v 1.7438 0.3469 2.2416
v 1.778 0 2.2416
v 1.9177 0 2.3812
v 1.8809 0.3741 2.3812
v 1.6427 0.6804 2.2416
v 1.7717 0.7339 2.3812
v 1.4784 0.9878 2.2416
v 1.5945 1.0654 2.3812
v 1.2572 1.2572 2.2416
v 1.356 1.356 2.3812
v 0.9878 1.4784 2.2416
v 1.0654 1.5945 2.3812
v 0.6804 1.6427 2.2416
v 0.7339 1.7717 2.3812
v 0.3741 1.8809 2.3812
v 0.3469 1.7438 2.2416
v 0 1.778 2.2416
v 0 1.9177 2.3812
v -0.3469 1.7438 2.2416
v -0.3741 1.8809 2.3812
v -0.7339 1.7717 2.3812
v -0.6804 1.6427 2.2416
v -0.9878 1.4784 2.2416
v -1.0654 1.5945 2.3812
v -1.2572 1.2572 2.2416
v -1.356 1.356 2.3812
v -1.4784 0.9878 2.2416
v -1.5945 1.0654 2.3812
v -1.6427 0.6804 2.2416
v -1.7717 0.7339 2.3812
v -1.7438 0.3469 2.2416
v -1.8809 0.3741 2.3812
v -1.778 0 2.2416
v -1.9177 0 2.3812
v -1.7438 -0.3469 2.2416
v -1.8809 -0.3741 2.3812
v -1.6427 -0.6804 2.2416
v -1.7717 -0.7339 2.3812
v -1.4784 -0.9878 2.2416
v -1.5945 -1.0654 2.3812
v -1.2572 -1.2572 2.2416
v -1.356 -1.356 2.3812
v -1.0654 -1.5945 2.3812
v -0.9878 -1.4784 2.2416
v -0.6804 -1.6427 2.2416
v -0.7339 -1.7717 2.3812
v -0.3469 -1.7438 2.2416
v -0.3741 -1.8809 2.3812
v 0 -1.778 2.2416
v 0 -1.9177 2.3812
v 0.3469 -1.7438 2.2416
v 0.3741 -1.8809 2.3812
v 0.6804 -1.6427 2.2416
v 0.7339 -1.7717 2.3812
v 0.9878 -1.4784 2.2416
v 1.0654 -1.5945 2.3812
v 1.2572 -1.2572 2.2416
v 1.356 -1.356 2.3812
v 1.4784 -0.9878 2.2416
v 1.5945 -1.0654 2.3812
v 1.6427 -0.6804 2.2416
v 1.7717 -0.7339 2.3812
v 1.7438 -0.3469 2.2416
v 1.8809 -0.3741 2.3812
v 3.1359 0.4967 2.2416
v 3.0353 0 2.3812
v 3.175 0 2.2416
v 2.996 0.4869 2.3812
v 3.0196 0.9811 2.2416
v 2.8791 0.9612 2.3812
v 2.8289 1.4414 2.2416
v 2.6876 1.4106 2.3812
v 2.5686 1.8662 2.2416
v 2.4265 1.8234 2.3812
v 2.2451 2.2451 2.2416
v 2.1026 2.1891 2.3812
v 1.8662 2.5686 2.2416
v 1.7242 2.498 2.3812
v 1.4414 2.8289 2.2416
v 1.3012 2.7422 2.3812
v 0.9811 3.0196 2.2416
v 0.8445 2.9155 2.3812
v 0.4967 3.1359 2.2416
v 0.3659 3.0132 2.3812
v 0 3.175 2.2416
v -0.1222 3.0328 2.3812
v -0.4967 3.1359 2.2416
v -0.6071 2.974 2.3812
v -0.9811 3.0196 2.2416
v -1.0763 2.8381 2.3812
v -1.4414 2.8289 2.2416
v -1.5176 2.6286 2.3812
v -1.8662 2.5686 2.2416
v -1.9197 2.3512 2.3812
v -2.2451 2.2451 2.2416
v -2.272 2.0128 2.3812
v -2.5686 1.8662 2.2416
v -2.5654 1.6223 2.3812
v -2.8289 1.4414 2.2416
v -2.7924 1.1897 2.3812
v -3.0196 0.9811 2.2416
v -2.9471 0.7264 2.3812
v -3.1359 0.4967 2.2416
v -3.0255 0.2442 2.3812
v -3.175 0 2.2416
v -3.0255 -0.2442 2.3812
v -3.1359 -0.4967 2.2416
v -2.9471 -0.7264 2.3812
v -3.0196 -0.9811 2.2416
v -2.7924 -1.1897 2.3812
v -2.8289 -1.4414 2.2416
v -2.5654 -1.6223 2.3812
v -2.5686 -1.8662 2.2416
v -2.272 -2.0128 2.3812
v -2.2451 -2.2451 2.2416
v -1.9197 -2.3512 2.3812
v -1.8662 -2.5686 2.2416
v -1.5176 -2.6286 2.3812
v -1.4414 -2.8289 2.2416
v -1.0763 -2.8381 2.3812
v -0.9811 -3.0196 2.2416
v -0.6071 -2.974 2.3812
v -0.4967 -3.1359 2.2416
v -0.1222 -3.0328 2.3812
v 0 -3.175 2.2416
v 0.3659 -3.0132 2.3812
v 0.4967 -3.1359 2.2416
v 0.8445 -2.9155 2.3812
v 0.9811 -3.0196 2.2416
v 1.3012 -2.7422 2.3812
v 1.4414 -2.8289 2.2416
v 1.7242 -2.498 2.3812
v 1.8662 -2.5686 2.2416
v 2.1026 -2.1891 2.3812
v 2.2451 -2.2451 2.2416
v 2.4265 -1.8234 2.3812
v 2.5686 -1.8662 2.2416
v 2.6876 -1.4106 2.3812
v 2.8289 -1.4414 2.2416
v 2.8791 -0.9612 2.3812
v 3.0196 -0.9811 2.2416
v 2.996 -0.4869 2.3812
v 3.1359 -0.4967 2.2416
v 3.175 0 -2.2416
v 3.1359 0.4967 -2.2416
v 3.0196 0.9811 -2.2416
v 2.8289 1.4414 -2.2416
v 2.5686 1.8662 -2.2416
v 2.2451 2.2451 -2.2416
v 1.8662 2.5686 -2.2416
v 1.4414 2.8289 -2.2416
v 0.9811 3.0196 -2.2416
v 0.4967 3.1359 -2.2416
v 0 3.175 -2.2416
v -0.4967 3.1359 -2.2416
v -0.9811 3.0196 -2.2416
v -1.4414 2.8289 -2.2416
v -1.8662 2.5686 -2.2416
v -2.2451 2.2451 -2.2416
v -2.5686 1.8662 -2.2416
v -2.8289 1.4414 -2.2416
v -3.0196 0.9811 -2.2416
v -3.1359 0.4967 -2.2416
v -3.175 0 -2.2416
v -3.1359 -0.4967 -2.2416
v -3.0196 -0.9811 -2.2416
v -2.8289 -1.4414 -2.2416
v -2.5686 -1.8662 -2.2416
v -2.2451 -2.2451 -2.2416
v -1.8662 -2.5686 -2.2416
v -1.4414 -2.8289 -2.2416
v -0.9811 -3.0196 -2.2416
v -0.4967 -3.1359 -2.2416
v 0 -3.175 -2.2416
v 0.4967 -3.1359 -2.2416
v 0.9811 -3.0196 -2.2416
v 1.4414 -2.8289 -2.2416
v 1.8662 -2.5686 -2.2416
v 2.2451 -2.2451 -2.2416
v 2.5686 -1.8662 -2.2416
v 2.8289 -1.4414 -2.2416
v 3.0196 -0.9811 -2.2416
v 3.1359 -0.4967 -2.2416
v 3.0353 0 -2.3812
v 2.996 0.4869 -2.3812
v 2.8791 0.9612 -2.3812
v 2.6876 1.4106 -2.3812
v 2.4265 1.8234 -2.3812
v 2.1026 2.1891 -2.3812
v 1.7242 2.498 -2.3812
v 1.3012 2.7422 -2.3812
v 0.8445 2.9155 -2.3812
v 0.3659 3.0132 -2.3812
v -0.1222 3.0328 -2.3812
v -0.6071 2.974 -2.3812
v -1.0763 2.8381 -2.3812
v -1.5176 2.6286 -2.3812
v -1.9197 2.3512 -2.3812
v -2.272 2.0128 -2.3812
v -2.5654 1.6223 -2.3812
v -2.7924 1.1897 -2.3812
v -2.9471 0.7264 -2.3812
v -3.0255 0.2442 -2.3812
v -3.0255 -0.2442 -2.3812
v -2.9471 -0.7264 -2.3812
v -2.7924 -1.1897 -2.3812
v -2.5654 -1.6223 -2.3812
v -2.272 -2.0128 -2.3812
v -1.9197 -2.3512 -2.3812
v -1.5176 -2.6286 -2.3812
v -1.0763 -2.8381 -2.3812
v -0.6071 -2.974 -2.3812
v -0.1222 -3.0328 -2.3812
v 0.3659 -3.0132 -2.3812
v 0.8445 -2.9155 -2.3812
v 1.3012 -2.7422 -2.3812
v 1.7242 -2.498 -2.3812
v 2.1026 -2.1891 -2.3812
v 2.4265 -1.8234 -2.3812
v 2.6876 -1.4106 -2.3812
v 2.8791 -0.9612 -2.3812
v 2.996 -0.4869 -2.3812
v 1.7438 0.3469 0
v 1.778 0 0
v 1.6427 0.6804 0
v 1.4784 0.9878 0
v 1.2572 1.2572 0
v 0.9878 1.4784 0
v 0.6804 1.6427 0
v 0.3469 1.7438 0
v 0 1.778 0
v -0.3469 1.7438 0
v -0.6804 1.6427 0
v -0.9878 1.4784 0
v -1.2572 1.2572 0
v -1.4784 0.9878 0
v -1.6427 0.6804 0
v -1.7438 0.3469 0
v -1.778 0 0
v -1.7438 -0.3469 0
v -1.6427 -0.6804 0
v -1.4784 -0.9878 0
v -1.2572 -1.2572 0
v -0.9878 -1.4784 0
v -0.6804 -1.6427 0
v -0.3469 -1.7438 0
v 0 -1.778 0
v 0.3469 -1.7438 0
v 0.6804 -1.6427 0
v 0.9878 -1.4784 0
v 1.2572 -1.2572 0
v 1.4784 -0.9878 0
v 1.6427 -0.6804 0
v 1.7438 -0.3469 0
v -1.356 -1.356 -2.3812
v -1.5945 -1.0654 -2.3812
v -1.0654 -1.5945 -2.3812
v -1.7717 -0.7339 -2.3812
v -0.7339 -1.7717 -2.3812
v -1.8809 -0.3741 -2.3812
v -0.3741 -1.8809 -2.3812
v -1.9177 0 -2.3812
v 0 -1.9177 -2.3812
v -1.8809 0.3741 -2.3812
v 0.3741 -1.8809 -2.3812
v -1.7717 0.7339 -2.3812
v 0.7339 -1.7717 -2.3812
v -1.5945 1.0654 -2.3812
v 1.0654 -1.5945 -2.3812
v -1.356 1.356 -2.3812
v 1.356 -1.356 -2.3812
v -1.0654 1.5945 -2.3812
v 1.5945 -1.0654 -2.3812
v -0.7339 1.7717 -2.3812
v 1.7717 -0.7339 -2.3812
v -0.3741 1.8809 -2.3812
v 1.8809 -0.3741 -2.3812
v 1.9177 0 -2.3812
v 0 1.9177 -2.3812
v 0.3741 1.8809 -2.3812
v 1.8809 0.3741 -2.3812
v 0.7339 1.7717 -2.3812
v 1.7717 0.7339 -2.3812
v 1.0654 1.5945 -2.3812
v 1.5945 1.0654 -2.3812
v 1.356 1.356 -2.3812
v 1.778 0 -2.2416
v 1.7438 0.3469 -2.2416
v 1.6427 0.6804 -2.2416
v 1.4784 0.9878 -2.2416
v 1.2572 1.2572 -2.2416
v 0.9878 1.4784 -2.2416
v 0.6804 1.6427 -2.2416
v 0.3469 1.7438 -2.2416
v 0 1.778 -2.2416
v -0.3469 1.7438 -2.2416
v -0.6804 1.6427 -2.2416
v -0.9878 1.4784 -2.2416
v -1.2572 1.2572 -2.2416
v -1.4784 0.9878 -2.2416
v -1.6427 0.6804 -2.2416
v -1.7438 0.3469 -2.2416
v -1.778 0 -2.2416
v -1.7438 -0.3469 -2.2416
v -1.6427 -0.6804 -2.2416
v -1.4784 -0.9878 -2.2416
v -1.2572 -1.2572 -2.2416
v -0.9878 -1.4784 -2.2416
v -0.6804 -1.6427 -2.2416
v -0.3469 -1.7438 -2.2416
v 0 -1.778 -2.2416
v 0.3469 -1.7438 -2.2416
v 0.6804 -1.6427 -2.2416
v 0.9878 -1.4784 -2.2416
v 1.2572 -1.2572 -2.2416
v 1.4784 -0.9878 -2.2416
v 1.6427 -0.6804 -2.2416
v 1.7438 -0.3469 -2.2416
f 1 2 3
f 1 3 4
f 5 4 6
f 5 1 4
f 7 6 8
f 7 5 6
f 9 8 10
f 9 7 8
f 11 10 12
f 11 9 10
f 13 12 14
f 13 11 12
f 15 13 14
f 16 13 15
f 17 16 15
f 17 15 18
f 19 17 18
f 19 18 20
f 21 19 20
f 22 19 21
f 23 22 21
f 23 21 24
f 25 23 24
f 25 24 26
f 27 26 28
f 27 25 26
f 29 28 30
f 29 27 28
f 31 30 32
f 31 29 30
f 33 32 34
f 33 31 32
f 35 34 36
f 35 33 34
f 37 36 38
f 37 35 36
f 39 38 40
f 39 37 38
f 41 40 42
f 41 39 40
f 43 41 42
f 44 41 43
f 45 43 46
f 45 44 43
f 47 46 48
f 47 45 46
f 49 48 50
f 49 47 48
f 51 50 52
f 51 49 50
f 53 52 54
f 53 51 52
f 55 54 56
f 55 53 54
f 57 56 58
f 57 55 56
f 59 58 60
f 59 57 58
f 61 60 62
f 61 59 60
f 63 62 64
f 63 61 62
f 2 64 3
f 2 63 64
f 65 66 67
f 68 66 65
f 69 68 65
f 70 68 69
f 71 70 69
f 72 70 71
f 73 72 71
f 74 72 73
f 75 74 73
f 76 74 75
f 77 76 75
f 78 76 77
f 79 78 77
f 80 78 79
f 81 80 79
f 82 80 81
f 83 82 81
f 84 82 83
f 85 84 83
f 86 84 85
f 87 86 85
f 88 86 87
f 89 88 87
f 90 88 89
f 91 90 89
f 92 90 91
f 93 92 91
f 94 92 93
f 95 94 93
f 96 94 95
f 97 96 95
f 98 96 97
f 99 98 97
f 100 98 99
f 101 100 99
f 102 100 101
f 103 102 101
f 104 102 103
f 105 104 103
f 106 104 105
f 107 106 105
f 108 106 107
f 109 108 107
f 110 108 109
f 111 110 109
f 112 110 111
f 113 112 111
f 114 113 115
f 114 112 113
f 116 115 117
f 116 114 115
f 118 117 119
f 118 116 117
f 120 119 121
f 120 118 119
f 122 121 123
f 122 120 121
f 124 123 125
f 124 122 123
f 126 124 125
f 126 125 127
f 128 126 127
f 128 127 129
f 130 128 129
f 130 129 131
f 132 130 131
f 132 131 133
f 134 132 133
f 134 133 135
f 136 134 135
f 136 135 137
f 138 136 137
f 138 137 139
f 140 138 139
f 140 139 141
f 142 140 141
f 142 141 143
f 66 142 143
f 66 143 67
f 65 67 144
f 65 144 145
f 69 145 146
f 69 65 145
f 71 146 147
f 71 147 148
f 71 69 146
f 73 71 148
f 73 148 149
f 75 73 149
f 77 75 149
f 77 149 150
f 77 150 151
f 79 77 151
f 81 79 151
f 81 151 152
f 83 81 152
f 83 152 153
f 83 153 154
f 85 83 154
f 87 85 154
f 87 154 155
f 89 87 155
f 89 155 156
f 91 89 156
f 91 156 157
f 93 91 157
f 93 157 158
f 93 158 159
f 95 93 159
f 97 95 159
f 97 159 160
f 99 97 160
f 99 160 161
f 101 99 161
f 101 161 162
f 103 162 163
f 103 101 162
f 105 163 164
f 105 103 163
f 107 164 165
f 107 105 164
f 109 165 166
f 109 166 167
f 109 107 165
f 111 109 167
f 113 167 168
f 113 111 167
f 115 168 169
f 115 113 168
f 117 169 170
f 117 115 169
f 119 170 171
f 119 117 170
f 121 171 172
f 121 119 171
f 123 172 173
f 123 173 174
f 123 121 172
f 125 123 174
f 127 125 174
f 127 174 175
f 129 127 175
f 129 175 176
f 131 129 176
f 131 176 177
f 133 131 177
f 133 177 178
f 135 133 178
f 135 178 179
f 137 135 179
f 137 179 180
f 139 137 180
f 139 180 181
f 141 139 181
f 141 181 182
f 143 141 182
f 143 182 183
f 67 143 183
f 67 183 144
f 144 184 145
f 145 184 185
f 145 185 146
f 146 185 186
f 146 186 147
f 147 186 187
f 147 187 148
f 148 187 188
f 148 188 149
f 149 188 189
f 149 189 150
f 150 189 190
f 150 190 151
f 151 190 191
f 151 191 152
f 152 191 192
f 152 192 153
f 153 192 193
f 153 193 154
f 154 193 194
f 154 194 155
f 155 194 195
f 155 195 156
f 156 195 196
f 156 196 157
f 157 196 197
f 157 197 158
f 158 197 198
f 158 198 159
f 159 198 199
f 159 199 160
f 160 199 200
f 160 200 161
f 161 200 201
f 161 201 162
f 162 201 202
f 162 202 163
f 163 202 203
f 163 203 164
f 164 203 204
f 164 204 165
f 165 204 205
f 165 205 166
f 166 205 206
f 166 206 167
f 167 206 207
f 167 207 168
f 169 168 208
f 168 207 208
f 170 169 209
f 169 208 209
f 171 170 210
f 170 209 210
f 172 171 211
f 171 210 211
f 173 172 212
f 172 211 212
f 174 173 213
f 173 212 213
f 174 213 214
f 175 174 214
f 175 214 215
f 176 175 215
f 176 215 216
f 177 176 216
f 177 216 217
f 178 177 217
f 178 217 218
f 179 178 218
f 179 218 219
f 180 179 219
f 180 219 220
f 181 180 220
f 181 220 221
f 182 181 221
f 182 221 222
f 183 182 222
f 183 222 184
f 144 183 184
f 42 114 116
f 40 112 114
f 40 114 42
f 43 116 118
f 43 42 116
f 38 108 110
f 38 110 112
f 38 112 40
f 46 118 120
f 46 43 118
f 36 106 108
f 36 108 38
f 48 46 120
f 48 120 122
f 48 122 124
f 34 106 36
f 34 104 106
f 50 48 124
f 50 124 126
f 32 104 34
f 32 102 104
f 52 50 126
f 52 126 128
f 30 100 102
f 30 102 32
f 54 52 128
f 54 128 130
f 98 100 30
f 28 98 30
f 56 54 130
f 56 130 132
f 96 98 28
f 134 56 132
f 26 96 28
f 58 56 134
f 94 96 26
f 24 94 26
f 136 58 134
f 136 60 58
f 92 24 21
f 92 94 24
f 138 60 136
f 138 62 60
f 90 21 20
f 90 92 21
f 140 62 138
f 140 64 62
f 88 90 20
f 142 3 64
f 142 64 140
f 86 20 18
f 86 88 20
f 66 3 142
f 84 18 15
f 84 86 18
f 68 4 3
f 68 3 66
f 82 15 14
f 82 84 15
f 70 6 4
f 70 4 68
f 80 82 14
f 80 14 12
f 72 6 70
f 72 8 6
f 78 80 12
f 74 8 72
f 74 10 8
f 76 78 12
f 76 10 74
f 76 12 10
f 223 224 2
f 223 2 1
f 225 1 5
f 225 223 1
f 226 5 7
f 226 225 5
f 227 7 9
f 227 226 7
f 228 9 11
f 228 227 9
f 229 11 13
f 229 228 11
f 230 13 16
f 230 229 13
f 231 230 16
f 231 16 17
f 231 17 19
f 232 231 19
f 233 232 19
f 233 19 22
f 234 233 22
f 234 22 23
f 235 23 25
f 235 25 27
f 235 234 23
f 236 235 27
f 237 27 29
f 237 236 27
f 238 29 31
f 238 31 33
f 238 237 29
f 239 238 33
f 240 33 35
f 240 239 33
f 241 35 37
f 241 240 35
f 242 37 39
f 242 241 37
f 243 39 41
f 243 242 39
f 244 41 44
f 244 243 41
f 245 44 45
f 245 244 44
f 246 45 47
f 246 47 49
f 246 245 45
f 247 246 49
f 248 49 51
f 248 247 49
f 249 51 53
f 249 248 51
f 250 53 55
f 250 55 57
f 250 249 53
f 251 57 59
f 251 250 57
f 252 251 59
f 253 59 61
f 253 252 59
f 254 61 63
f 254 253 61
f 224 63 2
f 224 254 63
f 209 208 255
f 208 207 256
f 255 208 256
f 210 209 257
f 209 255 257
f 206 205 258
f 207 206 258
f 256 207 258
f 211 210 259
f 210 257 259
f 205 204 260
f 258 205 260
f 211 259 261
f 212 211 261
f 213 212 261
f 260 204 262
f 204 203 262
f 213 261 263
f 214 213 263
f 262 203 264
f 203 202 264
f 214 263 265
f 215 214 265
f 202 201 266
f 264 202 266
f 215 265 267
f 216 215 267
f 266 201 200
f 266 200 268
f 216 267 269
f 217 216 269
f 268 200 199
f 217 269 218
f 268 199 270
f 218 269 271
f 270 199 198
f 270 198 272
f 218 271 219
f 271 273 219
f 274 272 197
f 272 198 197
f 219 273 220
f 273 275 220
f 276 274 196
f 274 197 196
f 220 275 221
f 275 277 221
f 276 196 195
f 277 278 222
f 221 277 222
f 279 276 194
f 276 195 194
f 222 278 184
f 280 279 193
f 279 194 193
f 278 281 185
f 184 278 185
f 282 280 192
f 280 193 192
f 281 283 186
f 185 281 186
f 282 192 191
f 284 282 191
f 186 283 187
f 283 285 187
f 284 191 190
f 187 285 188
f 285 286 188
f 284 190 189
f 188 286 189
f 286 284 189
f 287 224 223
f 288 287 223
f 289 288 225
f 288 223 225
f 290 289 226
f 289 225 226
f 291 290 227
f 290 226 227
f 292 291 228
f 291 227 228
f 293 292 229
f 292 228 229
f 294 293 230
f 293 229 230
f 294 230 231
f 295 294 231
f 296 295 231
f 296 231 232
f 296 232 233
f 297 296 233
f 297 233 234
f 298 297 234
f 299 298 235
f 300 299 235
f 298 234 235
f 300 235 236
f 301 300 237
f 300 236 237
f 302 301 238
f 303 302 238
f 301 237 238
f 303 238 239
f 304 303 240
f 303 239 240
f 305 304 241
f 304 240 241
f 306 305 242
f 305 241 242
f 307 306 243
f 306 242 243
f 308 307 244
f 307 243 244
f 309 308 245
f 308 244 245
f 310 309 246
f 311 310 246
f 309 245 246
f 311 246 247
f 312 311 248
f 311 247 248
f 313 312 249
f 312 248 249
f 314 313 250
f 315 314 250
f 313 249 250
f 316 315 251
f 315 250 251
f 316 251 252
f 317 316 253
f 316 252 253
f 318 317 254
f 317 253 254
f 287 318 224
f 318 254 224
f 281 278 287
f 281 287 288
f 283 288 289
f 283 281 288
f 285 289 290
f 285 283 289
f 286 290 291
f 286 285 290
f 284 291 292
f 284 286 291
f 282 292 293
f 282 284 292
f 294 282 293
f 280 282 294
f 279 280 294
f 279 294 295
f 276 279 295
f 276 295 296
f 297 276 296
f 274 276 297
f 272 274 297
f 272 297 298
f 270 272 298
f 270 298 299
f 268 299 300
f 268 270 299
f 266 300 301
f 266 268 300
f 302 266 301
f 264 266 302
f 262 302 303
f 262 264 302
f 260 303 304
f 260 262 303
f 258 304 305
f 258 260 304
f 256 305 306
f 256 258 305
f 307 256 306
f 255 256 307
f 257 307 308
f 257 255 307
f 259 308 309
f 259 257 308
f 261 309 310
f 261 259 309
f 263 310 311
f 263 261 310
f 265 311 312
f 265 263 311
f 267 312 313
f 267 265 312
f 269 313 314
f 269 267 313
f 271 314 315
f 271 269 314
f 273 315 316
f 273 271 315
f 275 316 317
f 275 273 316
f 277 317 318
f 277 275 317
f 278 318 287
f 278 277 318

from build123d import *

# Parameters (mm, degrees)
SKETCH3_R                = 3.175
SKETCH3_R_2              = 1.778
BOSS_EXTRUDE1_DEPTH      = 2.38125
BOSS_EXTRUDE1_DEPTH_BACK = 2.38125
CHAMFER1_SIZE            = 0.1397


with BuildPart() as part:
    # Sketch3 → Boss-Extrude1 (new body, two sides)
    with BuildSketch(Plane.XY) as boss_extrude1_sk:
        Circle(SKETCH3_R)
        Circle(SKETCH3_R_2, mode=Mode.SUBTRACT)
    extrude(amount=BOSS_EXTRUDE1_DEPTH)
    extrude(boss_extrude1_sk.sketch, amount=-BOSS_EXTRUDE1_DEPTH_BACK)

    # Chamfer1
    chamfer1_edges = [part.edges().sort_by_distance(p)[0] for p in [
        (-3.175, 0, -2.38125),
        (-1.778, 0, -2.38125),
        (-3.175, 0, 2.38125),
        (-1.778, 0, 2.38125),
    ]]
    chamfer(chamfer1_edges, length=CHAMFER1_SIZE)


solid = part.part
